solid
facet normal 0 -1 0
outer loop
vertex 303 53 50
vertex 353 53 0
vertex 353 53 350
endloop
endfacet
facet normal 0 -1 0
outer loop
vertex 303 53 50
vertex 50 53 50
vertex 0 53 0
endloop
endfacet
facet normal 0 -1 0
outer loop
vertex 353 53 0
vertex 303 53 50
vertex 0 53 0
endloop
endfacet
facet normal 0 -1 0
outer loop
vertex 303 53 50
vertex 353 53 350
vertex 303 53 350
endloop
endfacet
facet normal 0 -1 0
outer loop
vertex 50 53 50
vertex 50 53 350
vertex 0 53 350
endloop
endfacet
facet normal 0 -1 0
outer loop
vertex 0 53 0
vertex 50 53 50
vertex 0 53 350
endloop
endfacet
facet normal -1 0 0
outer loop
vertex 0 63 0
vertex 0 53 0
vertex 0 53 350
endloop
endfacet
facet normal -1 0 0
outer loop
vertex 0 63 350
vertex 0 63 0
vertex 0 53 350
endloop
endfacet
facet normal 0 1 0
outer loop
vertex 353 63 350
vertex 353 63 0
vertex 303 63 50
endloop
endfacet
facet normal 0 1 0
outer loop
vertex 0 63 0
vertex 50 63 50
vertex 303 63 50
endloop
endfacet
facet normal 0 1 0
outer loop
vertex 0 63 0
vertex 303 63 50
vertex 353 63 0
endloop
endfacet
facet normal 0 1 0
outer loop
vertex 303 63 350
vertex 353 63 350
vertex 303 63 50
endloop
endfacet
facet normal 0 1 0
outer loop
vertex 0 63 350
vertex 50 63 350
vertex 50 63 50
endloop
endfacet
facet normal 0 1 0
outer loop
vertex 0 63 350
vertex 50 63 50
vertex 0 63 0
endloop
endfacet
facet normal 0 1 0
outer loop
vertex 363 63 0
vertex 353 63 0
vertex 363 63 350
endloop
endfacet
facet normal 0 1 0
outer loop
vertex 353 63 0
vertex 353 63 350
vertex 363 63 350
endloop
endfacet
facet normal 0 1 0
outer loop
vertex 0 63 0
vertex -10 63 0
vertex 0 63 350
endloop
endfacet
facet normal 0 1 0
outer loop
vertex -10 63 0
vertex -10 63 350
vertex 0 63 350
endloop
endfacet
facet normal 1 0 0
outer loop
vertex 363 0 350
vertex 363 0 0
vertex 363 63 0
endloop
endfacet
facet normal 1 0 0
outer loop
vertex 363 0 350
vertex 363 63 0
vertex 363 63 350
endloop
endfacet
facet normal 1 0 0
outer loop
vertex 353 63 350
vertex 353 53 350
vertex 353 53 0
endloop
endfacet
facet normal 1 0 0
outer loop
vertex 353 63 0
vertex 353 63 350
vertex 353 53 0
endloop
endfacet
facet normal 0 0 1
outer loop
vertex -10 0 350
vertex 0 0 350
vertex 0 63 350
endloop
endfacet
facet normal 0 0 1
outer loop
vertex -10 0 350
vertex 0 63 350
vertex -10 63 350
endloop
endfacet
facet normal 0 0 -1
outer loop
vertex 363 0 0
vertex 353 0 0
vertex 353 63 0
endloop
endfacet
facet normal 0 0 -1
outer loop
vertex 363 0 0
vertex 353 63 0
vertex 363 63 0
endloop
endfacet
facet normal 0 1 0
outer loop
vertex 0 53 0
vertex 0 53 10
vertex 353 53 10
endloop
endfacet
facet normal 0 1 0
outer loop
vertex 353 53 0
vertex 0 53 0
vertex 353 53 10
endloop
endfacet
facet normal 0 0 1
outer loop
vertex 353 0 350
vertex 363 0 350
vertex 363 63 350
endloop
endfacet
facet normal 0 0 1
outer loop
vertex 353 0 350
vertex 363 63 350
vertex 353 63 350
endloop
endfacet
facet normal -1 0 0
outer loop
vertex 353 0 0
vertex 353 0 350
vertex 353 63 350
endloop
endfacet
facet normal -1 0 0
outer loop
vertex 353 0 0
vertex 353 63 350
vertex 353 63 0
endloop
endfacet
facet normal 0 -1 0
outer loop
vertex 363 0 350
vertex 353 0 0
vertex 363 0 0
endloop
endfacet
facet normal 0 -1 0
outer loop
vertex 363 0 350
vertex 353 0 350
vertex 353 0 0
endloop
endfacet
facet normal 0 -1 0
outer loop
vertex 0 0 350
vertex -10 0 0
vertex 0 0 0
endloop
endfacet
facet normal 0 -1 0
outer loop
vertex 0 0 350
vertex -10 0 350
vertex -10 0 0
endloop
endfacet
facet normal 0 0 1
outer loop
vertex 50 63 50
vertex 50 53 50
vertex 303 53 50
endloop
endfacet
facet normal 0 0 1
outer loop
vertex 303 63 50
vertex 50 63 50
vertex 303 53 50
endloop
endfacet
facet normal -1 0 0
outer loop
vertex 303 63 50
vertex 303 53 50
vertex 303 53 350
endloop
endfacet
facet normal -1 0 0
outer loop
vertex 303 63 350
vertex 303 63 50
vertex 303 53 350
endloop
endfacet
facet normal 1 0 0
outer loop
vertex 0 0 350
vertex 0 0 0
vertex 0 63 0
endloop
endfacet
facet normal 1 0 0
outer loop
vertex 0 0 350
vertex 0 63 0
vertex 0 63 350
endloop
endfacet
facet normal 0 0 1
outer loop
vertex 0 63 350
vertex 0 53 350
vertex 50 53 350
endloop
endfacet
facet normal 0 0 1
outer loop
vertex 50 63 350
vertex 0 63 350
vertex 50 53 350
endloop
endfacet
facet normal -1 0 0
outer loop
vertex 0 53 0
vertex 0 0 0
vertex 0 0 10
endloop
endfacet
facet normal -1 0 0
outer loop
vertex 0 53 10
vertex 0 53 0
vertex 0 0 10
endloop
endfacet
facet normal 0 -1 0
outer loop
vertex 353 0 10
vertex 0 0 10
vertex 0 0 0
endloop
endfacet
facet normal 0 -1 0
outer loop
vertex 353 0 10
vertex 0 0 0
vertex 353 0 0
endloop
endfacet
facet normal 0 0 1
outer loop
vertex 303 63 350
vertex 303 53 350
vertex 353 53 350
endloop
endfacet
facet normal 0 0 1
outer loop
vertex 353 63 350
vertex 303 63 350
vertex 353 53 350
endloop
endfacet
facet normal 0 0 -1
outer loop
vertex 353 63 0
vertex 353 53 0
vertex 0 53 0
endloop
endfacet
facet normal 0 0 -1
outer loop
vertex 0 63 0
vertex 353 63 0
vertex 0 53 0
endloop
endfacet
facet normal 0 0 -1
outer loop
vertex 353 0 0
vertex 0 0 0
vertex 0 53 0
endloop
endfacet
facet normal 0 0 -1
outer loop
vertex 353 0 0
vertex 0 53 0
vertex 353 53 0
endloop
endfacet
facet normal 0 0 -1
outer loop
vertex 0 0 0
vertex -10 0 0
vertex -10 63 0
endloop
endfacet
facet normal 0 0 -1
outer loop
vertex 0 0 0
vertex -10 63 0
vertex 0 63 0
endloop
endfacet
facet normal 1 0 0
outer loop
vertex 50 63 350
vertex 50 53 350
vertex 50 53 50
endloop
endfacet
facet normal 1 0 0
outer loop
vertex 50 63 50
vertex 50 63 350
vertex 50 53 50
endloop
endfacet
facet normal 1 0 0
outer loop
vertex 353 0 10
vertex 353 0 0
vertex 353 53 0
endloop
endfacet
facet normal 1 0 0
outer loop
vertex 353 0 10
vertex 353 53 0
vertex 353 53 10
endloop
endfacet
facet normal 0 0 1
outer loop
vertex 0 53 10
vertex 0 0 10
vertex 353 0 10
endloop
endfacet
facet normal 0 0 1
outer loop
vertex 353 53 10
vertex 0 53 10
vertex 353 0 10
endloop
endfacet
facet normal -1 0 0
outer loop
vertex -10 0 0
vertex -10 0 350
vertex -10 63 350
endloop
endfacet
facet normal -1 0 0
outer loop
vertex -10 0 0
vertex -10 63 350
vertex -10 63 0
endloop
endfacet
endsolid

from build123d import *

# Parameters (mm, degrees)
F1_DEPTH = 63
F2_W     = 353
F2_H     = 10
F3_DEPTH = 53
F5_DEPTH = 10


with BuildPart() as f1:
    # F0 (on Front) → F1 (new body)
    with BuildSketch(Plane.XZ):
        Polygon((-10, 0), (0, 0), (0, 10), (0, 350), (-10, 350), align=None)
        Polygon((353, 10), (353, 0), (363, 0), (363, 350), (353, 350), align=None)
    extrude(amount=-F1_DEPTH)


with BuildPart() as f3:
    # F2 (on Front) → F3 (new body)
    with BuildSketch(Plane.XZ):
        with Locations((176.5, 5)):
            Rectangle(F2_W, F2_H)
    extrude(amount=-F3_DEPTH)


with BuildPart() as f5:
    # F4 (on face) → F5 (new body)
    with BuildSketch(Plane(origin=(0, 53, 0), x_dir=(-1, 0, 0), z_dir=(0, 1, 0))):
        Polygon((-353, 0), (0, 0), (0, 350), (-50, 350), (-50, 50), (-303, 50), (-303, 350), (-353, 350), align=None)
    extrude(amount=F5_DEPTH)


solid = Compound([f1.part, f3.part, f5.part])
